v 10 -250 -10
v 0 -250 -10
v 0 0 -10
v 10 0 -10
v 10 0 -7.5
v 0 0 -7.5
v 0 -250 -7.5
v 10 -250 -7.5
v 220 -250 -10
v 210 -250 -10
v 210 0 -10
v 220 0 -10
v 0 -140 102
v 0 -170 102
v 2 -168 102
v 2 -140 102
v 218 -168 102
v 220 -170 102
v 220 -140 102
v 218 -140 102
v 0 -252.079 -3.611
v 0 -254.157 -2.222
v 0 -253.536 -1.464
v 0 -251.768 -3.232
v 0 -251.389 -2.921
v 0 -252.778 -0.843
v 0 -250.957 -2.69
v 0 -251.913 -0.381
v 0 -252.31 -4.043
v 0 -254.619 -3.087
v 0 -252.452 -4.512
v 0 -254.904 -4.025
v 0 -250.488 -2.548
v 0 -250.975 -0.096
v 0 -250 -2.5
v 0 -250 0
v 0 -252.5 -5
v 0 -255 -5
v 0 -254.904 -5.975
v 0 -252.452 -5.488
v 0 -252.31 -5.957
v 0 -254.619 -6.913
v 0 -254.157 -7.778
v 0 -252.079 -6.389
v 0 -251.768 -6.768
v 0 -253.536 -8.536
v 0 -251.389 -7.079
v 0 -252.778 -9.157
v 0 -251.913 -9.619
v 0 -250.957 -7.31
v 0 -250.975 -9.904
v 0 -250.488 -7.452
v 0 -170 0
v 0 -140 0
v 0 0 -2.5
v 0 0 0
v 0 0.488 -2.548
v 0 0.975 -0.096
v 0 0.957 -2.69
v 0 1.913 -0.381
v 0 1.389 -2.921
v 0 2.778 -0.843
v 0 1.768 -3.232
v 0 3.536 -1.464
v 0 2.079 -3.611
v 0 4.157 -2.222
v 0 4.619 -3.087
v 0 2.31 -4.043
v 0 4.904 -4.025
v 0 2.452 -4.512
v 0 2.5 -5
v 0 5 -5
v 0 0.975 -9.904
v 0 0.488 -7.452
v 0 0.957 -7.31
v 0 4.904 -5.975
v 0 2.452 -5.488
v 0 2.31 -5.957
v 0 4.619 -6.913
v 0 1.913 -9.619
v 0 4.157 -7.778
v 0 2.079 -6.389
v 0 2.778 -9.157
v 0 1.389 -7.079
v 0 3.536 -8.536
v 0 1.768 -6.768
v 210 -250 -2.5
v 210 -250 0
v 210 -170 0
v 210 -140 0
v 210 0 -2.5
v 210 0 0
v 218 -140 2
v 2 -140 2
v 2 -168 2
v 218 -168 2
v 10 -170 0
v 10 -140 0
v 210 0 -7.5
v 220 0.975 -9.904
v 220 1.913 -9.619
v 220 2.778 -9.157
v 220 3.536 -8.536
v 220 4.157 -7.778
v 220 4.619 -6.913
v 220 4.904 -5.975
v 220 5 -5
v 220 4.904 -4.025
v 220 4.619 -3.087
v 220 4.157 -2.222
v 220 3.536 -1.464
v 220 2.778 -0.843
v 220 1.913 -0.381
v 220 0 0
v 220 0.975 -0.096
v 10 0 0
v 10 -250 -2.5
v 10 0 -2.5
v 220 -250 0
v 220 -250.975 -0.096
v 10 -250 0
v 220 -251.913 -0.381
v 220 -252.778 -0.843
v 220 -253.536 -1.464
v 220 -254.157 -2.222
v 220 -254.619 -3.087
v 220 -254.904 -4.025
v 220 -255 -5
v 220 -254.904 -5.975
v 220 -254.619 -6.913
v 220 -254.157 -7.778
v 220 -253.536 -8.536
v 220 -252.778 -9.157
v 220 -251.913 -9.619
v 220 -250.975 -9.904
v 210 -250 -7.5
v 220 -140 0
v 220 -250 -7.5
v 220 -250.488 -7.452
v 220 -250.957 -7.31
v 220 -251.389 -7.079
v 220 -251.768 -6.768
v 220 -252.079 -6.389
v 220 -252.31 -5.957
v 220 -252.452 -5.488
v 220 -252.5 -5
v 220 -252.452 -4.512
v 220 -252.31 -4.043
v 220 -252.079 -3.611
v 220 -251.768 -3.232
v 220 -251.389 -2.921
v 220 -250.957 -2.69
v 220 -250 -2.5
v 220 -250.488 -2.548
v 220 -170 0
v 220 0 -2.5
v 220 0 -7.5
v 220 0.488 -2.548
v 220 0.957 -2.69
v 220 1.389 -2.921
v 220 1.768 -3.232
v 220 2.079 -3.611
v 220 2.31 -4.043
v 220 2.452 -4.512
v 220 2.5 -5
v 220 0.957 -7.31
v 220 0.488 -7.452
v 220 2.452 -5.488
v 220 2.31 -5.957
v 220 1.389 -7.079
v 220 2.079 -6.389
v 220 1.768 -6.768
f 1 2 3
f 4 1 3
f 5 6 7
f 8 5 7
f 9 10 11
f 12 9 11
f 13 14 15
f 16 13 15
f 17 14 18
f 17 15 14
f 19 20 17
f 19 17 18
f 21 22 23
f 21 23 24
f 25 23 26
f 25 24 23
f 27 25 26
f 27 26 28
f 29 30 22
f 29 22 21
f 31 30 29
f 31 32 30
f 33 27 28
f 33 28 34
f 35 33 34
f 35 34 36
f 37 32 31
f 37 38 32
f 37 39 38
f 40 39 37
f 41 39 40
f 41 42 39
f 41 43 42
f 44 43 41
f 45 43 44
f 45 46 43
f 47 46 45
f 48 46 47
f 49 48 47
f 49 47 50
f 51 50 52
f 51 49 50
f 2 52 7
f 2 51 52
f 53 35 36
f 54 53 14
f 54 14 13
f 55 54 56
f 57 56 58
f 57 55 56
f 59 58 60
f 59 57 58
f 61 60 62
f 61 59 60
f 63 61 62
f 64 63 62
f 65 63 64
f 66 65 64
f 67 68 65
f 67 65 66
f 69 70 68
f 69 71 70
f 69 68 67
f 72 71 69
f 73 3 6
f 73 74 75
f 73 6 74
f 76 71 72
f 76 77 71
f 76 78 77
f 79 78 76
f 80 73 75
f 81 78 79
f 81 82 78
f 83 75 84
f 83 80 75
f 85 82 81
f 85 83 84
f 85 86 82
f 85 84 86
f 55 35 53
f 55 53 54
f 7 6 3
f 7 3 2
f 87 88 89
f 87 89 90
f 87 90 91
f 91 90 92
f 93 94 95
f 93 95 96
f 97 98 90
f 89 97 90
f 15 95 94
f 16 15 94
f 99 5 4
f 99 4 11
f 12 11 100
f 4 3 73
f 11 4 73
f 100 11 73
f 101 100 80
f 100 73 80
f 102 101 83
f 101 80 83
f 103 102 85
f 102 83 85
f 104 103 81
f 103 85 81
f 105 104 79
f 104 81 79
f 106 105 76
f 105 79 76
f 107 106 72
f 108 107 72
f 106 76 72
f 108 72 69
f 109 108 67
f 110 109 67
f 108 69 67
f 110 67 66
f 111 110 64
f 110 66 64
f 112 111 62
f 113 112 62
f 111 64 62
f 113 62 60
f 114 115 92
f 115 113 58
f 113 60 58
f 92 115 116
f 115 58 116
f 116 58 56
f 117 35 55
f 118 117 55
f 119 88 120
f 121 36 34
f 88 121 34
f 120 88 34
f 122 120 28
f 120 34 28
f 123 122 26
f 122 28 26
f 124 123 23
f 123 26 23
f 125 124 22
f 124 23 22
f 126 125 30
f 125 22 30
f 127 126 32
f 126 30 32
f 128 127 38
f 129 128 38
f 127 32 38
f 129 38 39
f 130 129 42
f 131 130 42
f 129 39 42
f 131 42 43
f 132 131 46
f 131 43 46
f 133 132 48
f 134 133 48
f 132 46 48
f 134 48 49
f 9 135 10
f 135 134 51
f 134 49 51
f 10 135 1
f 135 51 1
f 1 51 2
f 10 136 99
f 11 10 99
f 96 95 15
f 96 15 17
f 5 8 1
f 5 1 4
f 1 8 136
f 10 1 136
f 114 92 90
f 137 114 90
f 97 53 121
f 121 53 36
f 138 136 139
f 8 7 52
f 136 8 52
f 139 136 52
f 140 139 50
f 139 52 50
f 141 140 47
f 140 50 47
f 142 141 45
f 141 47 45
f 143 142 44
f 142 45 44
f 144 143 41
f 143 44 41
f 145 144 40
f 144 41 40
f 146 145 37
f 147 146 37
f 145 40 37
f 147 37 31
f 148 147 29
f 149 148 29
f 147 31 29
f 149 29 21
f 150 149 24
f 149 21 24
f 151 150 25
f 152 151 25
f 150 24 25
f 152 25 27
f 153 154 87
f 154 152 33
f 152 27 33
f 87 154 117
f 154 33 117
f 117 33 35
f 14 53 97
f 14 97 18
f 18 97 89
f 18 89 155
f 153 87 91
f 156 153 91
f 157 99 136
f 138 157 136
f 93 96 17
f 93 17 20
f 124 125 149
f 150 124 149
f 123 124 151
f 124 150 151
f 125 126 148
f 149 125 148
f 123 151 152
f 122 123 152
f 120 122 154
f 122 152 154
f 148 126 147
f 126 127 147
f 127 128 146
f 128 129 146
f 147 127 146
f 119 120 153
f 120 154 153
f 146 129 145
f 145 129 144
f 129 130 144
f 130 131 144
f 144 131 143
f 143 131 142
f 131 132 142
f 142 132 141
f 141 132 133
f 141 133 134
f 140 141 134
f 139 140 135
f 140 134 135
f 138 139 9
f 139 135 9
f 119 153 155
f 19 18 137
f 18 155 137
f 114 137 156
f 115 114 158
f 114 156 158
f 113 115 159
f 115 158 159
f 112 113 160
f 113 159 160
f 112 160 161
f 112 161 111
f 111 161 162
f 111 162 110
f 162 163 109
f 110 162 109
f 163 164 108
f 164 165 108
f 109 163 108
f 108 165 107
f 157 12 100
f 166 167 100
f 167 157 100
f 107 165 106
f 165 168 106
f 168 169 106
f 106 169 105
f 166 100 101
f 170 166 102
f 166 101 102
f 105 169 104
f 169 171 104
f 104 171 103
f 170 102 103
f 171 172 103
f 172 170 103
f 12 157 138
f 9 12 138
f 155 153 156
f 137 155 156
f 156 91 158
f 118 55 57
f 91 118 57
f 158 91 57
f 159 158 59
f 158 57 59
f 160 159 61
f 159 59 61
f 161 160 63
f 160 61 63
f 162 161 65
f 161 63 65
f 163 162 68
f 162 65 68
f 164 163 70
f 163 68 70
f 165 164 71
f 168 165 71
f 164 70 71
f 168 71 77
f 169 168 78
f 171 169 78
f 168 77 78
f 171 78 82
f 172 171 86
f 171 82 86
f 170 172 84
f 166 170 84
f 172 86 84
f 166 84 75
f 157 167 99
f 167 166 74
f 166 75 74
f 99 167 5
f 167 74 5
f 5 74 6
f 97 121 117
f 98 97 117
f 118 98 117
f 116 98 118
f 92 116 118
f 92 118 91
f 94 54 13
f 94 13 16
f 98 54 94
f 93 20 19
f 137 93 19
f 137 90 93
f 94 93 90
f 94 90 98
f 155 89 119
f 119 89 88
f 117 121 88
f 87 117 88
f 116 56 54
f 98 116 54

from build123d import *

# Parameters (mm, degrees)
BOSS_EXTRU_1_DEPTH      = 220
ENL_V_MAT_EXTRU_1_REACH = 222
ESQUISSE4_W             = 200
ESQUISSE4_H             = 250
ENL_V_MAT_EXTRU_2_DEPTH = 200
ESQUISSE5_W             = 220
ESQUISSE5_H             = 30
BOSS_EXTRU_2_DEPTH      = 2
ESQUISSE7_W             = 220
ESQUISSE7_H             = 2
BOSS_EXTRU_4_DEPTH      = 100
ESQUISSE8_W             = 2
ESQUISSE8_H             = 28
BOSS_EXTRU_5_DEPTH      = 100


with BuildPart() as part:
    # Esquisse1 → Boss.-Extru.1 (new body)
    with BuildSketch(Plane(origin=(0, 0, 0), x_dir=(0, 0, -1), z_dir=(1, 0, 0))):
        with BuildLine():
            Line((0, 0), (0, -250))
            ThreePointArc((0, -250), (5, -255), (10, -250))
            Line((10, -250), (10, 0))
            ThreePointArc((10, 0), (5, 5), (0, 0))
        make_face()
    extrude(amount=BOSS_EXTRU_1_DEPTH)

    # Esquisse2 → Enlèv. mat.-Extru.1 (cut, up to next)
    with BuildSketch(Plane.ZY, mode=Mode.PRIVATE) as enl_v_mat_extru_1_sk1:
        with BuildLine():
            Line((-7.5, 0), (-7.5, -250))
            ThreePointArc((-7.5, -250), (-5, -252.5), (-2.5, -250))
            Line((-2.5, -250), (-2.5, 0))
            ThreePointArc((-2.5, 0), (-5, 2.5), (-7.5, 0))
        make_face()
    enl_v_mat_extru_1_tool1 = extrude(enl_v_mat_extru_1_sk1.sketch, amount=-ENL_V_MAT_EXTRU_1_REACH, mode=Mode.PRIVATE) & part.part
    add(enl_v_mat_extru_1_tool1.solids().sort_by_distance((0, -125, -5))[0], mode=Mode.SUBTRACT)

    # Esquisse4 → Enlèv. mat.-Extru.2 (cut)
    with BuildSketch(Plane.XY):
        with Locations((110, -125)):
            Rectangle(ESQUISSE4_W, ESQUISSE4_H)
    extrude(amount=-ENL_V_MAT_EXTRU_2_DEPTH, mode=Mode.SUBTRACT)

    # Esquisse5 → Boss.-Extru.2 (add)
    with BuildSketch(Plane.XY):
        with Locations((110, -155)):
            Rectangle(ESQUISSE5_W, ESQUISSE5_H)
    extrude(amount=BOSS_EXTRU_2_DEPTH)

    # Esquisse7 → Boss.-Extru.4 (add)
    with BuildSketch(Plane.XY.offset(2)):
        with Locations((110, -169)):
            Rectangle(ESQUISSE7_W, ESQUISSE7_H)
    extrude(amount=BOSS_EXTRU_4_DEPTH)

    # Esquisse8 → Boss.-Extru.5 (add)
    with BuildSketch(Plane.XY.offset(2)):
        with Locations((1, -154)):
            Rectangle(ESQUISSE8_W, ESQUISSE8_H)
        with Locations((219, -154)):
            Rectangle(ESQUISSE8_W, ESQUISSE8_H)
    extrude(amount=BOSS_EXTRU_5_DEPTH)


solid = part.part
